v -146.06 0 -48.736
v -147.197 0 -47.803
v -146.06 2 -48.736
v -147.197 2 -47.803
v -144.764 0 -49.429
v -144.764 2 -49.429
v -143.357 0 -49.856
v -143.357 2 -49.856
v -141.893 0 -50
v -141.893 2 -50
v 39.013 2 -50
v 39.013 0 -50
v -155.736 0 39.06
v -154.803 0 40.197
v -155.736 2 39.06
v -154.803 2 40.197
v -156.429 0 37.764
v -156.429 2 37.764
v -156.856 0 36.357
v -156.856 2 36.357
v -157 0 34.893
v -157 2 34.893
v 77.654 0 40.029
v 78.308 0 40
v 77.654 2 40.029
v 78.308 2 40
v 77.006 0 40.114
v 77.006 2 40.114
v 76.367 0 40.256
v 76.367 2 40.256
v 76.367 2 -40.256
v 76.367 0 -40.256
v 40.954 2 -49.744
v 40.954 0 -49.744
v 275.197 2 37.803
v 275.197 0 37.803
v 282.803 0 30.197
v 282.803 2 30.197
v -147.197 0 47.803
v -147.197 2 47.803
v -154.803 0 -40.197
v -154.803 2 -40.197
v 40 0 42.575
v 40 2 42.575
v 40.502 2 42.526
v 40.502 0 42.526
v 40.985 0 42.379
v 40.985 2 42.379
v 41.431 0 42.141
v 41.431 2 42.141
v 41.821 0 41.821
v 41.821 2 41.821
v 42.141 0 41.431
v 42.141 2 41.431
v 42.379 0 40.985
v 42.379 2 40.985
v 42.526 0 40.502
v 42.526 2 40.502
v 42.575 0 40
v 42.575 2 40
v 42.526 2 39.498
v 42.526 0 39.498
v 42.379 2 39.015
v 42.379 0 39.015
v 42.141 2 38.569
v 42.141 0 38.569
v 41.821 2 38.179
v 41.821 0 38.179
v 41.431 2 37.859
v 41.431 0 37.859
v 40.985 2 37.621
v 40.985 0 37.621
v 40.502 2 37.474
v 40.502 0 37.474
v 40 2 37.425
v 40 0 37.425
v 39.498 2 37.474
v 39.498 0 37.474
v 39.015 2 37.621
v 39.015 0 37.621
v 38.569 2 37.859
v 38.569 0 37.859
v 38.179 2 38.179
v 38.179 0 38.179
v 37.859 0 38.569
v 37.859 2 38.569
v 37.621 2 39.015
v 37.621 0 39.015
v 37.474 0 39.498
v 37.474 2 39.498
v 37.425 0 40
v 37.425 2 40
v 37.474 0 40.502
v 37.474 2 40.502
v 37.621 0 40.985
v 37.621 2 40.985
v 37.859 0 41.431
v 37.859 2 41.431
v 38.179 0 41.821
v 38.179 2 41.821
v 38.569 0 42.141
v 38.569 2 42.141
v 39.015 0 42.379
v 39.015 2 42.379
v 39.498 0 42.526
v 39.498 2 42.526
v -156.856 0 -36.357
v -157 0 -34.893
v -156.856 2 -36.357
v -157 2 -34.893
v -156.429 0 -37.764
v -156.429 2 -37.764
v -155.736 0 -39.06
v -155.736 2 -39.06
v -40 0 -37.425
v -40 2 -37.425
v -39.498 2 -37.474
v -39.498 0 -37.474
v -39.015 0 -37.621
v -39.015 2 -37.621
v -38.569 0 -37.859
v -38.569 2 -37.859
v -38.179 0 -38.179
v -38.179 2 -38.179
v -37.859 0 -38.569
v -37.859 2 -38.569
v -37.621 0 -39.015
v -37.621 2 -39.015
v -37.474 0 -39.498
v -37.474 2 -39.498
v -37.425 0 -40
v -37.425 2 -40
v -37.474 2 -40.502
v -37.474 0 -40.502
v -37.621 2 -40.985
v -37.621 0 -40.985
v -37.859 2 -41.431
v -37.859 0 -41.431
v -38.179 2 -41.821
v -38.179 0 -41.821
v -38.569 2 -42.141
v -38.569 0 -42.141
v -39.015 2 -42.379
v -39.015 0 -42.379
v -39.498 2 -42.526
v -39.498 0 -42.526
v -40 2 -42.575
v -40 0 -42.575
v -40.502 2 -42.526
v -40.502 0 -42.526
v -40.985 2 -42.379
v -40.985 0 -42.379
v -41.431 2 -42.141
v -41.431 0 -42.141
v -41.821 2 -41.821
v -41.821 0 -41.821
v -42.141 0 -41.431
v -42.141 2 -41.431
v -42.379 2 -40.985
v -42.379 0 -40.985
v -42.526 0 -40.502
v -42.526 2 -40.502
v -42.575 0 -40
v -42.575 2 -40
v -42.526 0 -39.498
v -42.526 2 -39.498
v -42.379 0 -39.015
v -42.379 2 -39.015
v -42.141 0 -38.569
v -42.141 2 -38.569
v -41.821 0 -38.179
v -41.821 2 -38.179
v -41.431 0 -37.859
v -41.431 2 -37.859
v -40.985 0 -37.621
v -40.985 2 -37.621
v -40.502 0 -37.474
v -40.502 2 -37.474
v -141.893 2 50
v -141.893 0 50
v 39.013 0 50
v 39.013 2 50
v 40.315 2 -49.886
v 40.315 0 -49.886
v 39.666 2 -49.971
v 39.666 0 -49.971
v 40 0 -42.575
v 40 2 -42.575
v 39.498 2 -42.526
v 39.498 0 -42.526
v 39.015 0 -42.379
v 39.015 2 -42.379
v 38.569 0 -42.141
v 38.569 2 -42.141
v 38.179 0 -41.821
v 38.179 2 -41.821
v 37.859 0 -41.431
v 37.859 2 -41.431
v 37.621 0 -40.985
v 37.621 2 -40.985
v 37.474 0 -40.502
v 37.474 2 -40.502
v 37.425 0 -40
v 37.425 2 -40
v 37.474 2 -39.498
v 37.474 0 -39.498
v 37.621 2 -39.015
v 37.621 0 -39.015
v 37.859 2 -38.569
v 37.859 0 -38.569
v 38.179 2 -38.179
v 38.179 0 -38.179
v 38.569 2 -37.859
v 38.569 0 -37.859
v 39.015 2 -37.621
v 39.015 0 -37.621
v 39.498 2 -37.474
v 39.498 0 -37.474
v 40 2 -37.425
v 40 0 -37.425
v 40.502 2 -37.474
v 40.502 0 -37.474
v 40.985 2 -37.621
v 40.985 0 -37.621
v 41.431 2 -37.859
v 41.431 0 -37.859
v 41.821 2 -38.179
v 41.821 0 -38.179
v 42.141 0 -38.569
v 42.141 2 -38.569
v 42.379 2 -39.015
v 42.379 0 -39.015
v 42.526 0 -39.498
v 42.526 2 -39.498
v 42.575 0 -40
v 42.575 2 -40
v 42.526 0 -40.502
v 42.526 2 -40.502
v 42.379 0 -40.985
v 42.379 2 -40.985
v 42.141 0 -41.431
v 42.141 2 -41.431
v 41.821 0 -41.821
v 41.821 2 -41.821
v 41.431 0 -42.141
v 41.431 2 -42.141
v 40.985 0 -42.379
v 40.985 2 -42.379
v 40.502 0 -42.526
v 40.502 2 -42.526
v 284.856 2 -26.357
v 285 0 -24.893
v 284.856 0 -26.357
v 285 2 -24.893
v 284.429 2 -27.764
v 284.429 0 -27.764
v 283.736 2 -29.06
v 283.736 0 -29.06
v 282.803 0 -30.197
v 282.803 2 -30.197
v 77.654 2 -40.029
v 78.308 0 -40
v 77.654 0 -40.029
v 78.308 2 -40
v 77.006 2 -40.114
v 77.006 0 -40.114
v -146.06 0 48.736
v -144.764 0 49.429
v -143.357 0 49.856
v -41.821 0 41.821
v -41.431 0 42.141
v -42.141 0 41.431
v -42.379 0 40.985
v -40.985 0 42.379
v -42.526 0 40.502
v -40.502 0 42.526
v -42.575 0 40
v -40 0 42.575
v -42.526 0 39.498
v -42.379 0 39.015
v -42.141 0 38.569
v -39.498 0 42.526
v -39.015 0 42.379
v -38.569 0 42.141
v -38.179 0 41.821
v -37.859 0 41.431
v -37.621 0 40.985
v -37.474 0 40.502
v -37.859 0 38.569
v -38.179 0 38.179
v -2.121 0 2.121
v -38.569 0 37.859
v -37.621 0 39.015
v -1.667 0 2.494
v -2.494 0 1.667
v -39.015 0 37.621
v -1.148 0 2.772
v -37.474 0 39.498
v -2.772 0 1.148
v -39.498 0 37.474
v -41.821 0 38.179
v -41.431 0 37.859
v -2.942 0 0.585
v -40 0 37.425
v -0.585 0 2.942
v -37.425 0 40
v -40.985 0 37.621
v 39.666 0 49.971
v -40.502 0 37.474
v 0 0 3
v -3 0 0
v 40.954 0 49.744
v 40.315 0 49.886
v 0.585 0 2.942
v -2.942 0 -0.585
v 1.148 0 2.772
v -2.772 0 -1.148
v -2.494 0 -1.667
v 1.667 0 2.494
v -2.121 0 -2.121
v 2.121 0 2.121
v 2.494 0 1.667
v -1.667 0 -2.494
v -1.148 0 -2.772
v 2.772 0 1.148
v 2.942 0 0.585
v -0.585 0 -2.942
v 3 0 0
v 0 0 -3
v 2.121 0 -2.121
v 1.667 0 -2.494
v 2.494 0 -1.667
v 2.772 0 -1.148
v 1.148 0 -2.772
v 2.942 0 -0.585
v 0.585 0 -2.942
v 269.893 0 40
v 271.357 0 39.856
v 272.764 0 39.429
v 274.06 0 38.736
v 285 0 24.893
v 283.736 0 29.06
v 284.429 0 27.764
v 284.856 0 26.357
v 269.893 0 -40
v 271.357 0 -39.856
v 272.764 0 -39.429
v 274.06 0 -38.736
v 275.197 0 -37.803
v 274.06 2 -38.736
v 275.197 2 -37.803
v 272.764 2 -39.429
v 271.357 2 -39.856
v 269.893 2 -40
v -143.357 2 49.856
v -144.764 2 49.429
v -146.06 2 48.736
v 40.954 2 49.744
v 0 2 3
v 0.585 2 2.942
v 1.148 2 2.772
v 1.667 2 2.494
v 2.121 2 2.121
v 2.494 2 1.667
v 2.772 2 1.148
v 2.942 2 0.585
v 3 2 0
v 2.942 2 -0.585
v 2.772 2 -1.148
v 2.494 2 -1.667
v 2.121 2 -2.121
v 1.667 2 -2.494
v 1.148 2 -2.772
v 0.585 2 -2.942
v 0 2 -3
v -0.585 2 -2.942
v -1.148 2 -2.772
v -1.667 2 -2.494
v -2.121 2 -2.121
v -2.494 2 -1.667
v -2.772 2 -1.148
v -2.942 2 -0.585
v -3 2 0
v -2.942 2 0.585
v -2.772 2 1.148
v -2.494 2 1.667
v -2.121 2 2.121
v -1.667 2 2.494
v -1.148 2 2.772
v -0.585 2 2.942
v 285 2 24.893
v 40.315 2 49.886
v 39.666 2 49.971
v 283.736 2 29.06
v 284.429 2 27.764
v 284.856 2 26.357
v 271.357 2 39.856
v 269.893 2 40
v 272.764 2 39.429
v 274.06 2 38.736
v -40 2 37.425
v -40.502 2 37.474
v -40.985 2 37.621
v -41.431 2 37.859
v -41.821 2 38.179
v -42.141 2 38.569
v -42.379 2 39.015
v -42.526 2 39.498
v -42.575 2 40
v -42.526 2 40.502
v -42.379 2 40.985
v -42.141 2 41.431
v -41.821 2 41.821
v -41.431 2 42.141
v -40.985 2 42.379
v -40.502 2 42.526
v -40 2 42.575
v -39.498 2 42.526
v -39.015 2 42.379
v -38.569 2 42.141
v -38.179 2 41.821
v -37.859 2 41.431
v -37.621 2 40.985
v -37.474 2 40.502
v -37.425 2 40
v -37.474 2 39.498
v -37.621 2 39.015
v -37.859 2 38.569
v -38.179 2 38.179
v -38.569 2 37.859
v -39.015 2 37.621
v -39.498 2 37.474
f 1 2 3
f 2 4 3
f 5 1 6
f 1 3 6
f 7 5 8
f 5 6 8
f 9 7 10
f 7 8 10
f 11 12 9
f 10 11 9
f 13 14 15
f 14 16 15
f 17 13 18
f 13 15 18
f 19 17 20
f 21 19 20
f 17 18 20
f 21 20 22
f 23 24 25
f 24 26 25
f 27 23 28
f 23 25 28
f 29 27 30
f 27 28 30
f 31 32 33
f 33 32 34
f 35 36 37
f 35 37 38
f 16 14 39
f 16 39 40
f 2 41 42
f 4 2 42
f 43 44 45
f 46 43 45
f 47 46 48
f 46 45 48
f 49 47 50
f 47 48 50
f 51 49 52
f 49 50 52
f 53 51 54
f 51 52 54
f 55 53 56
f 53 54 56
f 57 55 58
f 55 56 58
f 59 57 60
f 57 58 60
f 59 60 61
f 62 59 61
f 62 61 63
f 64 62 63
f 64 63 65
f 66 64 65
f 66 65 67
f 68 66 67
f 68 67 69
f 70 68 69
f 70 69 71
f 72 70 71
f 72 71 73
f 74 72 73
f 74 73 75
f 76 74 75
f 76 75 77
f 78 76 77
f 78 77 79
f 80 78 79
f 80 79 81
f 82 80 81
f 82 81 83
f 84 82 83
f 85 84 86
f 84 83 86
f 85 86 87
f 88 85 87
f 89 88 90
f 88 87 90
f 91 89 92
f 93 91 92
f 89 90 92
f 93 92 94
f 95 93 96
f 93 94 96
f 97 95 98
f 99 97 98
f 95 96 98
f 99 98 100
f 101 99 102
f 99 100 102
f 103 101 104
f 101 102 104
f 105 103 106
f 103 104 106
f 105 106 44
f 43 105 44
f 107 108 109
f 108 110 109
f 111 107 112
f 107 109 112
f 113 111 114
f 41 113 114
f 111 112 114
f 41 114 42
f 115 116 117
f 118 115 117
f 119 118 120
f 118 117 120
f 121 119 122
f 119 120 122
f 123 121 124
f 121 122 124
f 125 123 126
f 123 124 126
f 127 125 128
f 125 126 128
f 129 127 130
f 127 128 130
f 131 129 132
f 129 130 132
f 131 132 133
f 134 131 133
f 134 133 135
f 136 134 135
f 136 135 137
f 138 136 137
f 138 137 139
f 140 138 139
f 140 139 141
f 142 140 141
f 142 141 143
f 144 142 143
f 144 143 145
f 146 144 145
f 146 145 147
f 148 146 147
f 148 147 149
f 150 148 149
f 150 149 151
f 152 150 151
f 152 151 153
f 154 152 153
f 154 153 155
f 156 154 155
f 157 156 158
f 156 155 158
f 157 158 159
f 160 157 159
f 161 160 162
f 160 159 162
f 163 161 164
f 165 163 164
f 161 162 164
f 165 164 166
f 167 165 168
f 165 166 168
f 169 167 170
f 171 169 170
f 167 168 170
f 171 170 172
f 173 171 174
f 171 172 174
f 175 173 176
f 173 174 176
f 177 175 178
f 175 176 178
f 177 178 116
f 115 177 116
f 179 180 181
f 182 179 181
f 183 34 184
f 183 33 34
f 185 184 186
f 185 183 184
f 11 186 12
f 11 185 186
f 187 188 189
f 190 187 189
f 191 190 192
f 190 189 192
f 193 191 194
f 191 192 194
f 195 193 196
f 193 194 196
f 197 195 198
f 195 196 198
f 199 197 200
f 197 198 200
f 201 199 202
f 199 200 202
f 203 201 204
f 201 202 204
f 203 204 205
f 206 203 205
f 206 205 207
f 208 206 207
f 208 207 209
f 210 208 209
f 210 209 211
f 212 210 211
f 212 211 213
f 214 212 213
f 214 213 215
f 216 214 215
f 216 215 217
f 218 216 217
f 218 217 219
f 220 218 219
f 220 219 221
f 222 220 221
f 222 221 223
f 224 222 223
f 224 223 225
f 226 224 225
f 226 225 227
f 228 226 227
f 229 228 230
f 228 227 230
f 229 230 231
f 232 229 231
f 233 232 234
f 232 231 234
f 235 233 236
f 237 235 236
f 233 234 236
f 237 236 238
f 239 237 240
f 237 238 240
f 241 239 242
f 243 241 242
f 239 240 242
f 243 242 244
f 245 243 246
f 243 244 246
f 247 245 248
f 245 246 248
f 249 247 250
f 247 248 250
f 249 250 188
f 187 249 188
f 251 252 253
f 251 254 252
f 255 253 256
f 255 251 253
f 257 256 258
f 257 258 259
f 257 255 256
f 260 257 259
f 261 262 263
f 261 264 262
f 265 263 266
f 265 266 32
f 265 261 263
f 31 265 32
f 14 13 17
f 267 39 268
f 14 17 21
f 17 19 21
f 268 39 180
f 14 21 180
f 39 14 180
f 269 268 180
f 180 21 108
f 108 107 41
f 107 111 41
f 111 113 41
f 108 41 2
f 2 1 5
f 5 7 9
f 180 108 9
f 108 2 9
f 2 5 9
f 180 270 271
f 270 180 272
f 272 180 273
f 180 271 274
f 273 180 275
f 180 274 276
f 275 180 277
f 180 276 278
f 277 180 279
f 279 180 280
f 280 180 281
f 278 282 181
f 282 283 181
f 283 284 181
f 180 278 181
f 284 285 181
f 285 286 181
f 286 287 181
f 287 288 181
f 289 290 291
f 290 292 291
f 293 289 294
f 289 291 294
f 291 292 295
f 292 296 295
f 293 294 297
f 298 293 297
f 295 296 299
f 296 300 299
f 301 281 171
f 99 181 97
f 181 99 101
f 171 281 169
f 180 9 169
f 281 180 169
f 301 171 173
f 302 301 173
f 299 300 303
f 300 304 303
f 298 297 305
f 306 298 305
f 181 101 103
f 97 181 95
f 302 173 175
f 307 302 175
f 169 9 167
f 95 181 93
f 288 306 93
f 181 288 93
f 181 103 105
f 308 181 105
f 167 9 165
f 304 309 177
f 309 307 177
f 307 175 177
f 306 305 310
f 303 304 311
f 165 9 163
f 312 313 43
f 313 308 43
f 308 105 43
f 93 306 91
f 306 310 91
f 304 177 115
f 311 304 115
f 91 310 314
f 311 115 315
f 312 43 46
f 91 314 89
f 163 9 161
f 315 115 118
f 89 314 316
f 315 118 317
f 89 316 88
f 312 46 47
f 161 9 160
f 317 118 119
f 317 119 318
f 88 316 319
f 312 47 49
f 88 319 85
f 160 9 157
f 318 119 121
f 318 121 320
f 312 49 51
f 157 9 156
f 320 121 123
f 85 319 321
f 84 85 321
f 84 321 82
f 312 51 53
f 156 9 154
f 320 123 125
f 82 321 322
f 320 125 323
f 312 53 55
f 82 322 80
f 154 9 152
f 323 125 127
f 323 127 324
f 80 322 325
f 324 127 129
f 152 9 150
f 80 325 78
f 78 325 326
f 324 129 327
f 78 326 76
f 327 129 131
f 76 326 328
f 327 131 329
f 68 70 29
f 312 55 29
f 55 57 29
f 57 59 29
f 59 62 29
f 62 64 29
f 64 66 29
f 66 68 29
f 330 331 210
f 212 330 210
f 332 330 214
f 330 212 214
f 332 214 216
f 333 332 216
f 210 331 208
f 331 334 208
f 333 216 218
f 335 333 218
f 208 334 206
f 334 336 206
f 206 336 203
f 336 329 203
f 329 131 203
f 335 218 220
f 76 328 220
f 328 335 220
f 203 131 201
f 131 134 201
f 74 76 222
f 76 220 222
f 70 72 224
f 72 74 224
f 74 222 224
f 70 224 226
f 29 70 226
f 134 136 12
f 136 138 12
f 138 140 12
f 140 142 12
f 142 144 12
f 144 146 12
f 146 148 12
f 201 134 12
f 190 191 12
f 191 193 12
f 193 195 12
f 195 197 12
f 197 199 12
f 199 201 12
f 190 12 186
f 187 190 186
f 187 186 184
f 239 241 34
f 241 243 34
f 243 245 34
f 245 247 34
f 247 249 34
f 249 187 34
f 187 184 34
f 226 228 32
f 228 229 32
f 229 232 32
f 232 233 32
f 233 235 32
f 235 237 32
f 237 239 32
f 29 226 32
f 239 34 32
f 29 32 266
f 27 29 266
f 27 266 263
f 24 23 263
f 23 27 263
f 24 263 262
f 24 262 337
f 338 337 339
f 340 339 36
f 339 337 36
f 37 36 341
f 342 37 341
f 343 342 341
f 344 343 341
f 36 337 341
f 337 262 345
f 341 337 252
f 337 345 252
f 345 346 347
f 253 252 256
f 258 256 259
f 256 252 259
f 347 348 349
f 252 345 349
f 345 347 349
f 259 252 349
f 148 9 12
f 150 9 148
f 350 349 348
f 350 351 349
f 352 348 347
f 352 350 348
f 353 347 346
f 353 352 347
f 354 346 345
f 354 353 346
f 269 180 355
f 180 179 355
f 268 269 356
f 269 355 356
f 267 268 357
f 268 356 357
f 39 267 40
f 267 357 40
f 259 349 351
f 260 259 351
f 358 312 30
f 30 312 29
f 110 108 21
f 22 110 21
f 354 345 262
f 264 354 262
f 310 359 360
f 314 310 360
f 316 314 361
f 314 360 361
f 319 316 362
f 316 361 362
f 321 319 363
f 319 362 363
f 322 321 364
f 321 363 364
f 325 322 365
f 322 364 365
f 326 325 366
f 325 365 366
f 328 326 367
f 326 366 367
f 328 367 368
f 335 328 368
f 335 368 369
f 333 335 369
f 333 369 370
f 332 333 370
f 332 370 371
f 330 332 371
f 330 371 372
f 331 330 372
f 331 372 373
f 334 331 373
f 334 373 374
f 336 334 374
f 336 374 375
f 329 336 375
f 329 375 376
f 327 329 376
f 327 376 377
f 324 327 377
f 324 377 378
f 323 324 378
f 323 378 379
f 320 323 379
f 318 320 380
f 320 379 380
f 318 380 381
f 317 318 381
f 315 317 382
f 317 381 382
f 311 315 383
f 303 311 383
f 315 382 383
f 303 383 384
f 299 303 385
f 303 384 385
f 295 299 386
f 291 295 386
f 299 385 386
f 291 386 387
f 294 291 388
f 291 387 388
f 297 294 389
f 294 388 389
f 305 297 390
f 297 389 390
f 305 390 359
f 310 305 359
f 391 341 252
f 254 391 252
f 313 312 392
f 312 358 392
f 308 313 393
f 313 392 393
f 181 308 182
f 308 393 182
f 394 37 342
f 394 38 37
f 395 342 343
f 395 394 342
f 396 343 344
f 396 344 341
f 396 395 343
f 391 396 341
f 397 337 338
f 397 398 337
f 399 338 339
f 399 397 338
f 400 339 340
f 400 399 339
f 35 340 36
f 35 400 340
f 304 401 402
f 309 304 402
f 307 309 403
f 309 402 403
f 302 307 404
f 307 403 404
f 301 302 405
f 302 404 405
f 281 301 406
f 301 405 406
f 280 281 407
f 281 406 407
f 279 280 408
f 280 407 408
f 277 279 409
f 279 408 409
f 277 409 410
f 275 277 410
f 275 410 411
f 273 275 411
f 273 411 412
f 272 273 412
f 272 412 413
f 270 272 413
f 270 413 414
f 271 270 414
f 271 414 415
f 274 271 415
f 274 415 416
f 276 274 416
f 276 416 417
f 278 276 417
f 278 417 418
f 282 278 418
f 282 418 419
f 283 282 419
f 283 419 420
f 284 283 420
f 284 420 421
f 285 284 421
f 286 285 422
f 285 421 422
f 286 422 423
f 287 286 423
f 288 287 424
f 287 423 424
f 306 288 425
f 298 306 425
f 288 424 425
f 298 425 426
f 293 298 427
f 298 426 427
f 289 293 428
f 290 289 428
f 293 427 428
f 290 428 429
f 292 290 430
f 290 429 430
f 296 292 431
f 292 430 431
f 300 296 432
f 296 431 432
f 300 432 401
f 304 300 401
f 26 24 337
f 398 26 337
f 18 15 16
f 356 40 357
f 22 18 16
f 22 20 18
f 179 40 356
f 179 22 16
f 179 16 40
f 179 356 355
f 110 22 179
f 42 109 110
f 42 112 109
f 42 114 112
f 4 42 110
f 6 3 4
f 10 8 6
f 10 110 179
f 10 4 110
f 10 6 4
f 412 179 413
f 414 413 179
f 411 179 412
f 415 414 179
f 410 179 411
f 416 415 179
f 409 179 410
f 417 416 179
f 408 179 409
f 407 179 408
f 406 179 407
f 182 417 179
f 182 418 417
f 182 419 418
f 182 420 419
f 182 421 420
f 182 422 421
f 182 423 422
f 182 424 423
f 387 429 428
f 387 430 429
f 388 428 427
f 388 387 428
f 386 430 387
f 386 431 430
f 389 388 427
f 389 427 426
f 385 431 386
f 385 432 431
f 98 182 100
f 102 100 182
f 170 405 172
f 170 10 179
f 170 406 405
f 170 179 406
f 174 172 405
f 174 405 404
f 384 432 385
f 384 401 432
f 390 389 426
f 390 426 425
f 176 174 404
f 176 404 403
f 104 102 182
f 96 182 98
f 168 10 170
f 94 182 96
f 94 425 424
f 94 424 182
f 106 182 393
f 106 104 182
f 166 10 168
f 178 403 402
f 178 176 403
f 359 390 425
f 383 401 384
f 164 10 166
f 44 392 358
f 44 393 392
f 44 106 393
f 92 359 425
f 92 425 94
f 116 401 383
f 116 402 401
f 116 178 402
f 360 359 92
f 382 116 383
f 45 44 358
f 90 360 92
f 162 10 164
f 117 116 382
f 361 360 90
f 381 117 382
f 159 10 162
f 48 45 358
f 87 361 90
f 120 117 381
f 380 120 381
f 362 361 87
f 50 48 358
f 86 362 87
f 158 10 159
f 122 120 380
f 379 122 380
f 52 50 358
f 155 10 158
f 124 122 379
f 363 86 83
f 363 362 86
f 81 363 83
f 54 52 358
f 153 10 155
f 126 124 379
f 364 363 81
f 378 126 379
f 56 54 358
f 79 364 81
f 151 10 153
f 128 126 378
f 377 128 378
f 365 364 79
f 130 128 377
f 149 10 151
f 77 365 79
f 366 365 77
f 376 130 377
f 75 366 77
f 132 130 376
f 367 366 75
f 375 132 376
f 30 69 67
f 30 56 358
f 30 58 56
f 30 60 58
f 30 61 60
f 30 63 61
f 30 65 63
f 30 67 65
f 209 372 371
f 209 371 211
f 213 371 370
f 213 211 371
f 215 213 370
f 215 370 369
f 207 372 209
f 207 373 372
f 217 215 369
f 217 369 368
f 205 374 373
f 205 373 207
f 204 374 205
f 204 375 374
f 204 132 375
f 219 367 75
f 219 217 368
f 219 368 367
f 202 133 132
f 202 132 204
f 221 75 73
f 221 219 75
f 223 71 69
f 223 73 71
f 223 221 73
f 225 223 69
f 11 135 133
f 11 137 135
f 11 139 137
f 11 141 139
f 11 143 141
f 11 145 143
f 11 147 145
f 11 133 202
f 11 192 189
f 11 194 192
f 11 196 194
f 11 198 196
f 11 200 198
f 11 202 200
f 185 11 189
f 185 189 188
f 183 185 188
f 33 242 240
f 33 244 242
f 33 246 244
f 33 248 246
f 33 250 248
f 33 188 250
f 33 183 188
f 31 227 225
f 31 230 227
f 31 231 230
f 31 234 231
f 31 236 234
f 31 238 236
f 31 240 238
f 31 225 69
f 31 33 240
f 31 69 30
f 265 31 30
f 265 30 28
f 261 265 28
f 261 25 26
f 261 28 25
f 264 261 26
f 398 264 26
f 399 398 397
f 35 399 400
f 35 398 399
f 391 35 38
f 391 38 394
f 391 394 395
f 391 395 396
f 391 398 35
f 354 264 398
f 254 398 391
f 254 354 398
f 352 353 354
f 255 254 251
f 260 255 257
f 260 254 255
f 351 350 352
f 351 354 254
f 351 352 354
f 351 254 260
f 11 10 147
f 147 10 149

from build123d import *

# Parameters (mm, degrees)
BOSS_EXTRUDE2_DEPTH = 2
CHAMFER2_SIZE       = 12
FILLET1_R           = 7.5
SKETCH2_R           = 2.575
SKETCH2_R_2         = 3
CUT_EXTRUDE1_DEPTH  = 290.359637821


with BuildPart() as part:
    # Sketch1 → Boss-Extrude2 (new body)
    with BuildSketch(Plane(origin=(0, 0, 0), x_dir=(1, 0, 0), z_dir=(0, 1, 0))):
        Polygon((40, -50), (77.320508076, -40), (285, -40), (285, 40), (77.320508076, 40), (40, 50), (-40, 50), (-157, 50), (-157, -50), (-40, -50), align=None)
    extrude(amount=BOSS_EXTRUDE2_DEPTH)

    # Chamfer2
    chamfer2_edges = [part.edges().sort_by_distance(p)[0] for p in [
        (-157, 1, 50),
        (-157, 1, -50),
        (285, 1, -40),
        (285, 1, 40),
    ]]
    chamfer(chamfer2_edges, length=CHAMFER2_SIZE)

    # Fillet1
    fillet1_edges = [part.edges().sort_by_distance(p)[0] for p in [
        (40, 1, -50),
        (77.320508076, 1, -40),
        (77.320508076, 1, 40),
        (40, 1, 50),
        (-145, 1, 50),
        (-157, 1, -38),
        (-157, 1, 38),
        (-145, 1, -50),
        (273, 1, -40),
        (285, 1, 28),
        (285, 1, -28),
        (273, 1, 40),
    ]]
    fillet(fillet1_edges, radius=FILLET1_R)

    # Sketch2 → Cut-Extrude1 (cut, through all)
    with BuildSketch(Plane(origin=(0, 2, 0), x_dir=(1, 0, 0), z_dir=(0, 1, 0))):
        with Locations(Location((-40, 40, 0), (0, 0, 270))):
            Circle(SKETCH2_R)
        with Locations(Location((40, 40, 0), (0, 0, 90))):
            Circle(SKETCH2_R)
        with Locations(Location((40, -40, 0), (0, 0, 270))):
            Circle(SKETCH2_R)
        with Locations(Location((-40, -40, 0), (0, 0, 90))):
            Circle(SKETCH2_R)
        with Locations(Location((0, 0, 0), (0, 0, 270))):
            Circle(SKETCH2_R_2)
    extrude(amount=-CUT_EXTRUDE1_DEPTH, mode=Mode.SUBTRACT)


solid = part.part
